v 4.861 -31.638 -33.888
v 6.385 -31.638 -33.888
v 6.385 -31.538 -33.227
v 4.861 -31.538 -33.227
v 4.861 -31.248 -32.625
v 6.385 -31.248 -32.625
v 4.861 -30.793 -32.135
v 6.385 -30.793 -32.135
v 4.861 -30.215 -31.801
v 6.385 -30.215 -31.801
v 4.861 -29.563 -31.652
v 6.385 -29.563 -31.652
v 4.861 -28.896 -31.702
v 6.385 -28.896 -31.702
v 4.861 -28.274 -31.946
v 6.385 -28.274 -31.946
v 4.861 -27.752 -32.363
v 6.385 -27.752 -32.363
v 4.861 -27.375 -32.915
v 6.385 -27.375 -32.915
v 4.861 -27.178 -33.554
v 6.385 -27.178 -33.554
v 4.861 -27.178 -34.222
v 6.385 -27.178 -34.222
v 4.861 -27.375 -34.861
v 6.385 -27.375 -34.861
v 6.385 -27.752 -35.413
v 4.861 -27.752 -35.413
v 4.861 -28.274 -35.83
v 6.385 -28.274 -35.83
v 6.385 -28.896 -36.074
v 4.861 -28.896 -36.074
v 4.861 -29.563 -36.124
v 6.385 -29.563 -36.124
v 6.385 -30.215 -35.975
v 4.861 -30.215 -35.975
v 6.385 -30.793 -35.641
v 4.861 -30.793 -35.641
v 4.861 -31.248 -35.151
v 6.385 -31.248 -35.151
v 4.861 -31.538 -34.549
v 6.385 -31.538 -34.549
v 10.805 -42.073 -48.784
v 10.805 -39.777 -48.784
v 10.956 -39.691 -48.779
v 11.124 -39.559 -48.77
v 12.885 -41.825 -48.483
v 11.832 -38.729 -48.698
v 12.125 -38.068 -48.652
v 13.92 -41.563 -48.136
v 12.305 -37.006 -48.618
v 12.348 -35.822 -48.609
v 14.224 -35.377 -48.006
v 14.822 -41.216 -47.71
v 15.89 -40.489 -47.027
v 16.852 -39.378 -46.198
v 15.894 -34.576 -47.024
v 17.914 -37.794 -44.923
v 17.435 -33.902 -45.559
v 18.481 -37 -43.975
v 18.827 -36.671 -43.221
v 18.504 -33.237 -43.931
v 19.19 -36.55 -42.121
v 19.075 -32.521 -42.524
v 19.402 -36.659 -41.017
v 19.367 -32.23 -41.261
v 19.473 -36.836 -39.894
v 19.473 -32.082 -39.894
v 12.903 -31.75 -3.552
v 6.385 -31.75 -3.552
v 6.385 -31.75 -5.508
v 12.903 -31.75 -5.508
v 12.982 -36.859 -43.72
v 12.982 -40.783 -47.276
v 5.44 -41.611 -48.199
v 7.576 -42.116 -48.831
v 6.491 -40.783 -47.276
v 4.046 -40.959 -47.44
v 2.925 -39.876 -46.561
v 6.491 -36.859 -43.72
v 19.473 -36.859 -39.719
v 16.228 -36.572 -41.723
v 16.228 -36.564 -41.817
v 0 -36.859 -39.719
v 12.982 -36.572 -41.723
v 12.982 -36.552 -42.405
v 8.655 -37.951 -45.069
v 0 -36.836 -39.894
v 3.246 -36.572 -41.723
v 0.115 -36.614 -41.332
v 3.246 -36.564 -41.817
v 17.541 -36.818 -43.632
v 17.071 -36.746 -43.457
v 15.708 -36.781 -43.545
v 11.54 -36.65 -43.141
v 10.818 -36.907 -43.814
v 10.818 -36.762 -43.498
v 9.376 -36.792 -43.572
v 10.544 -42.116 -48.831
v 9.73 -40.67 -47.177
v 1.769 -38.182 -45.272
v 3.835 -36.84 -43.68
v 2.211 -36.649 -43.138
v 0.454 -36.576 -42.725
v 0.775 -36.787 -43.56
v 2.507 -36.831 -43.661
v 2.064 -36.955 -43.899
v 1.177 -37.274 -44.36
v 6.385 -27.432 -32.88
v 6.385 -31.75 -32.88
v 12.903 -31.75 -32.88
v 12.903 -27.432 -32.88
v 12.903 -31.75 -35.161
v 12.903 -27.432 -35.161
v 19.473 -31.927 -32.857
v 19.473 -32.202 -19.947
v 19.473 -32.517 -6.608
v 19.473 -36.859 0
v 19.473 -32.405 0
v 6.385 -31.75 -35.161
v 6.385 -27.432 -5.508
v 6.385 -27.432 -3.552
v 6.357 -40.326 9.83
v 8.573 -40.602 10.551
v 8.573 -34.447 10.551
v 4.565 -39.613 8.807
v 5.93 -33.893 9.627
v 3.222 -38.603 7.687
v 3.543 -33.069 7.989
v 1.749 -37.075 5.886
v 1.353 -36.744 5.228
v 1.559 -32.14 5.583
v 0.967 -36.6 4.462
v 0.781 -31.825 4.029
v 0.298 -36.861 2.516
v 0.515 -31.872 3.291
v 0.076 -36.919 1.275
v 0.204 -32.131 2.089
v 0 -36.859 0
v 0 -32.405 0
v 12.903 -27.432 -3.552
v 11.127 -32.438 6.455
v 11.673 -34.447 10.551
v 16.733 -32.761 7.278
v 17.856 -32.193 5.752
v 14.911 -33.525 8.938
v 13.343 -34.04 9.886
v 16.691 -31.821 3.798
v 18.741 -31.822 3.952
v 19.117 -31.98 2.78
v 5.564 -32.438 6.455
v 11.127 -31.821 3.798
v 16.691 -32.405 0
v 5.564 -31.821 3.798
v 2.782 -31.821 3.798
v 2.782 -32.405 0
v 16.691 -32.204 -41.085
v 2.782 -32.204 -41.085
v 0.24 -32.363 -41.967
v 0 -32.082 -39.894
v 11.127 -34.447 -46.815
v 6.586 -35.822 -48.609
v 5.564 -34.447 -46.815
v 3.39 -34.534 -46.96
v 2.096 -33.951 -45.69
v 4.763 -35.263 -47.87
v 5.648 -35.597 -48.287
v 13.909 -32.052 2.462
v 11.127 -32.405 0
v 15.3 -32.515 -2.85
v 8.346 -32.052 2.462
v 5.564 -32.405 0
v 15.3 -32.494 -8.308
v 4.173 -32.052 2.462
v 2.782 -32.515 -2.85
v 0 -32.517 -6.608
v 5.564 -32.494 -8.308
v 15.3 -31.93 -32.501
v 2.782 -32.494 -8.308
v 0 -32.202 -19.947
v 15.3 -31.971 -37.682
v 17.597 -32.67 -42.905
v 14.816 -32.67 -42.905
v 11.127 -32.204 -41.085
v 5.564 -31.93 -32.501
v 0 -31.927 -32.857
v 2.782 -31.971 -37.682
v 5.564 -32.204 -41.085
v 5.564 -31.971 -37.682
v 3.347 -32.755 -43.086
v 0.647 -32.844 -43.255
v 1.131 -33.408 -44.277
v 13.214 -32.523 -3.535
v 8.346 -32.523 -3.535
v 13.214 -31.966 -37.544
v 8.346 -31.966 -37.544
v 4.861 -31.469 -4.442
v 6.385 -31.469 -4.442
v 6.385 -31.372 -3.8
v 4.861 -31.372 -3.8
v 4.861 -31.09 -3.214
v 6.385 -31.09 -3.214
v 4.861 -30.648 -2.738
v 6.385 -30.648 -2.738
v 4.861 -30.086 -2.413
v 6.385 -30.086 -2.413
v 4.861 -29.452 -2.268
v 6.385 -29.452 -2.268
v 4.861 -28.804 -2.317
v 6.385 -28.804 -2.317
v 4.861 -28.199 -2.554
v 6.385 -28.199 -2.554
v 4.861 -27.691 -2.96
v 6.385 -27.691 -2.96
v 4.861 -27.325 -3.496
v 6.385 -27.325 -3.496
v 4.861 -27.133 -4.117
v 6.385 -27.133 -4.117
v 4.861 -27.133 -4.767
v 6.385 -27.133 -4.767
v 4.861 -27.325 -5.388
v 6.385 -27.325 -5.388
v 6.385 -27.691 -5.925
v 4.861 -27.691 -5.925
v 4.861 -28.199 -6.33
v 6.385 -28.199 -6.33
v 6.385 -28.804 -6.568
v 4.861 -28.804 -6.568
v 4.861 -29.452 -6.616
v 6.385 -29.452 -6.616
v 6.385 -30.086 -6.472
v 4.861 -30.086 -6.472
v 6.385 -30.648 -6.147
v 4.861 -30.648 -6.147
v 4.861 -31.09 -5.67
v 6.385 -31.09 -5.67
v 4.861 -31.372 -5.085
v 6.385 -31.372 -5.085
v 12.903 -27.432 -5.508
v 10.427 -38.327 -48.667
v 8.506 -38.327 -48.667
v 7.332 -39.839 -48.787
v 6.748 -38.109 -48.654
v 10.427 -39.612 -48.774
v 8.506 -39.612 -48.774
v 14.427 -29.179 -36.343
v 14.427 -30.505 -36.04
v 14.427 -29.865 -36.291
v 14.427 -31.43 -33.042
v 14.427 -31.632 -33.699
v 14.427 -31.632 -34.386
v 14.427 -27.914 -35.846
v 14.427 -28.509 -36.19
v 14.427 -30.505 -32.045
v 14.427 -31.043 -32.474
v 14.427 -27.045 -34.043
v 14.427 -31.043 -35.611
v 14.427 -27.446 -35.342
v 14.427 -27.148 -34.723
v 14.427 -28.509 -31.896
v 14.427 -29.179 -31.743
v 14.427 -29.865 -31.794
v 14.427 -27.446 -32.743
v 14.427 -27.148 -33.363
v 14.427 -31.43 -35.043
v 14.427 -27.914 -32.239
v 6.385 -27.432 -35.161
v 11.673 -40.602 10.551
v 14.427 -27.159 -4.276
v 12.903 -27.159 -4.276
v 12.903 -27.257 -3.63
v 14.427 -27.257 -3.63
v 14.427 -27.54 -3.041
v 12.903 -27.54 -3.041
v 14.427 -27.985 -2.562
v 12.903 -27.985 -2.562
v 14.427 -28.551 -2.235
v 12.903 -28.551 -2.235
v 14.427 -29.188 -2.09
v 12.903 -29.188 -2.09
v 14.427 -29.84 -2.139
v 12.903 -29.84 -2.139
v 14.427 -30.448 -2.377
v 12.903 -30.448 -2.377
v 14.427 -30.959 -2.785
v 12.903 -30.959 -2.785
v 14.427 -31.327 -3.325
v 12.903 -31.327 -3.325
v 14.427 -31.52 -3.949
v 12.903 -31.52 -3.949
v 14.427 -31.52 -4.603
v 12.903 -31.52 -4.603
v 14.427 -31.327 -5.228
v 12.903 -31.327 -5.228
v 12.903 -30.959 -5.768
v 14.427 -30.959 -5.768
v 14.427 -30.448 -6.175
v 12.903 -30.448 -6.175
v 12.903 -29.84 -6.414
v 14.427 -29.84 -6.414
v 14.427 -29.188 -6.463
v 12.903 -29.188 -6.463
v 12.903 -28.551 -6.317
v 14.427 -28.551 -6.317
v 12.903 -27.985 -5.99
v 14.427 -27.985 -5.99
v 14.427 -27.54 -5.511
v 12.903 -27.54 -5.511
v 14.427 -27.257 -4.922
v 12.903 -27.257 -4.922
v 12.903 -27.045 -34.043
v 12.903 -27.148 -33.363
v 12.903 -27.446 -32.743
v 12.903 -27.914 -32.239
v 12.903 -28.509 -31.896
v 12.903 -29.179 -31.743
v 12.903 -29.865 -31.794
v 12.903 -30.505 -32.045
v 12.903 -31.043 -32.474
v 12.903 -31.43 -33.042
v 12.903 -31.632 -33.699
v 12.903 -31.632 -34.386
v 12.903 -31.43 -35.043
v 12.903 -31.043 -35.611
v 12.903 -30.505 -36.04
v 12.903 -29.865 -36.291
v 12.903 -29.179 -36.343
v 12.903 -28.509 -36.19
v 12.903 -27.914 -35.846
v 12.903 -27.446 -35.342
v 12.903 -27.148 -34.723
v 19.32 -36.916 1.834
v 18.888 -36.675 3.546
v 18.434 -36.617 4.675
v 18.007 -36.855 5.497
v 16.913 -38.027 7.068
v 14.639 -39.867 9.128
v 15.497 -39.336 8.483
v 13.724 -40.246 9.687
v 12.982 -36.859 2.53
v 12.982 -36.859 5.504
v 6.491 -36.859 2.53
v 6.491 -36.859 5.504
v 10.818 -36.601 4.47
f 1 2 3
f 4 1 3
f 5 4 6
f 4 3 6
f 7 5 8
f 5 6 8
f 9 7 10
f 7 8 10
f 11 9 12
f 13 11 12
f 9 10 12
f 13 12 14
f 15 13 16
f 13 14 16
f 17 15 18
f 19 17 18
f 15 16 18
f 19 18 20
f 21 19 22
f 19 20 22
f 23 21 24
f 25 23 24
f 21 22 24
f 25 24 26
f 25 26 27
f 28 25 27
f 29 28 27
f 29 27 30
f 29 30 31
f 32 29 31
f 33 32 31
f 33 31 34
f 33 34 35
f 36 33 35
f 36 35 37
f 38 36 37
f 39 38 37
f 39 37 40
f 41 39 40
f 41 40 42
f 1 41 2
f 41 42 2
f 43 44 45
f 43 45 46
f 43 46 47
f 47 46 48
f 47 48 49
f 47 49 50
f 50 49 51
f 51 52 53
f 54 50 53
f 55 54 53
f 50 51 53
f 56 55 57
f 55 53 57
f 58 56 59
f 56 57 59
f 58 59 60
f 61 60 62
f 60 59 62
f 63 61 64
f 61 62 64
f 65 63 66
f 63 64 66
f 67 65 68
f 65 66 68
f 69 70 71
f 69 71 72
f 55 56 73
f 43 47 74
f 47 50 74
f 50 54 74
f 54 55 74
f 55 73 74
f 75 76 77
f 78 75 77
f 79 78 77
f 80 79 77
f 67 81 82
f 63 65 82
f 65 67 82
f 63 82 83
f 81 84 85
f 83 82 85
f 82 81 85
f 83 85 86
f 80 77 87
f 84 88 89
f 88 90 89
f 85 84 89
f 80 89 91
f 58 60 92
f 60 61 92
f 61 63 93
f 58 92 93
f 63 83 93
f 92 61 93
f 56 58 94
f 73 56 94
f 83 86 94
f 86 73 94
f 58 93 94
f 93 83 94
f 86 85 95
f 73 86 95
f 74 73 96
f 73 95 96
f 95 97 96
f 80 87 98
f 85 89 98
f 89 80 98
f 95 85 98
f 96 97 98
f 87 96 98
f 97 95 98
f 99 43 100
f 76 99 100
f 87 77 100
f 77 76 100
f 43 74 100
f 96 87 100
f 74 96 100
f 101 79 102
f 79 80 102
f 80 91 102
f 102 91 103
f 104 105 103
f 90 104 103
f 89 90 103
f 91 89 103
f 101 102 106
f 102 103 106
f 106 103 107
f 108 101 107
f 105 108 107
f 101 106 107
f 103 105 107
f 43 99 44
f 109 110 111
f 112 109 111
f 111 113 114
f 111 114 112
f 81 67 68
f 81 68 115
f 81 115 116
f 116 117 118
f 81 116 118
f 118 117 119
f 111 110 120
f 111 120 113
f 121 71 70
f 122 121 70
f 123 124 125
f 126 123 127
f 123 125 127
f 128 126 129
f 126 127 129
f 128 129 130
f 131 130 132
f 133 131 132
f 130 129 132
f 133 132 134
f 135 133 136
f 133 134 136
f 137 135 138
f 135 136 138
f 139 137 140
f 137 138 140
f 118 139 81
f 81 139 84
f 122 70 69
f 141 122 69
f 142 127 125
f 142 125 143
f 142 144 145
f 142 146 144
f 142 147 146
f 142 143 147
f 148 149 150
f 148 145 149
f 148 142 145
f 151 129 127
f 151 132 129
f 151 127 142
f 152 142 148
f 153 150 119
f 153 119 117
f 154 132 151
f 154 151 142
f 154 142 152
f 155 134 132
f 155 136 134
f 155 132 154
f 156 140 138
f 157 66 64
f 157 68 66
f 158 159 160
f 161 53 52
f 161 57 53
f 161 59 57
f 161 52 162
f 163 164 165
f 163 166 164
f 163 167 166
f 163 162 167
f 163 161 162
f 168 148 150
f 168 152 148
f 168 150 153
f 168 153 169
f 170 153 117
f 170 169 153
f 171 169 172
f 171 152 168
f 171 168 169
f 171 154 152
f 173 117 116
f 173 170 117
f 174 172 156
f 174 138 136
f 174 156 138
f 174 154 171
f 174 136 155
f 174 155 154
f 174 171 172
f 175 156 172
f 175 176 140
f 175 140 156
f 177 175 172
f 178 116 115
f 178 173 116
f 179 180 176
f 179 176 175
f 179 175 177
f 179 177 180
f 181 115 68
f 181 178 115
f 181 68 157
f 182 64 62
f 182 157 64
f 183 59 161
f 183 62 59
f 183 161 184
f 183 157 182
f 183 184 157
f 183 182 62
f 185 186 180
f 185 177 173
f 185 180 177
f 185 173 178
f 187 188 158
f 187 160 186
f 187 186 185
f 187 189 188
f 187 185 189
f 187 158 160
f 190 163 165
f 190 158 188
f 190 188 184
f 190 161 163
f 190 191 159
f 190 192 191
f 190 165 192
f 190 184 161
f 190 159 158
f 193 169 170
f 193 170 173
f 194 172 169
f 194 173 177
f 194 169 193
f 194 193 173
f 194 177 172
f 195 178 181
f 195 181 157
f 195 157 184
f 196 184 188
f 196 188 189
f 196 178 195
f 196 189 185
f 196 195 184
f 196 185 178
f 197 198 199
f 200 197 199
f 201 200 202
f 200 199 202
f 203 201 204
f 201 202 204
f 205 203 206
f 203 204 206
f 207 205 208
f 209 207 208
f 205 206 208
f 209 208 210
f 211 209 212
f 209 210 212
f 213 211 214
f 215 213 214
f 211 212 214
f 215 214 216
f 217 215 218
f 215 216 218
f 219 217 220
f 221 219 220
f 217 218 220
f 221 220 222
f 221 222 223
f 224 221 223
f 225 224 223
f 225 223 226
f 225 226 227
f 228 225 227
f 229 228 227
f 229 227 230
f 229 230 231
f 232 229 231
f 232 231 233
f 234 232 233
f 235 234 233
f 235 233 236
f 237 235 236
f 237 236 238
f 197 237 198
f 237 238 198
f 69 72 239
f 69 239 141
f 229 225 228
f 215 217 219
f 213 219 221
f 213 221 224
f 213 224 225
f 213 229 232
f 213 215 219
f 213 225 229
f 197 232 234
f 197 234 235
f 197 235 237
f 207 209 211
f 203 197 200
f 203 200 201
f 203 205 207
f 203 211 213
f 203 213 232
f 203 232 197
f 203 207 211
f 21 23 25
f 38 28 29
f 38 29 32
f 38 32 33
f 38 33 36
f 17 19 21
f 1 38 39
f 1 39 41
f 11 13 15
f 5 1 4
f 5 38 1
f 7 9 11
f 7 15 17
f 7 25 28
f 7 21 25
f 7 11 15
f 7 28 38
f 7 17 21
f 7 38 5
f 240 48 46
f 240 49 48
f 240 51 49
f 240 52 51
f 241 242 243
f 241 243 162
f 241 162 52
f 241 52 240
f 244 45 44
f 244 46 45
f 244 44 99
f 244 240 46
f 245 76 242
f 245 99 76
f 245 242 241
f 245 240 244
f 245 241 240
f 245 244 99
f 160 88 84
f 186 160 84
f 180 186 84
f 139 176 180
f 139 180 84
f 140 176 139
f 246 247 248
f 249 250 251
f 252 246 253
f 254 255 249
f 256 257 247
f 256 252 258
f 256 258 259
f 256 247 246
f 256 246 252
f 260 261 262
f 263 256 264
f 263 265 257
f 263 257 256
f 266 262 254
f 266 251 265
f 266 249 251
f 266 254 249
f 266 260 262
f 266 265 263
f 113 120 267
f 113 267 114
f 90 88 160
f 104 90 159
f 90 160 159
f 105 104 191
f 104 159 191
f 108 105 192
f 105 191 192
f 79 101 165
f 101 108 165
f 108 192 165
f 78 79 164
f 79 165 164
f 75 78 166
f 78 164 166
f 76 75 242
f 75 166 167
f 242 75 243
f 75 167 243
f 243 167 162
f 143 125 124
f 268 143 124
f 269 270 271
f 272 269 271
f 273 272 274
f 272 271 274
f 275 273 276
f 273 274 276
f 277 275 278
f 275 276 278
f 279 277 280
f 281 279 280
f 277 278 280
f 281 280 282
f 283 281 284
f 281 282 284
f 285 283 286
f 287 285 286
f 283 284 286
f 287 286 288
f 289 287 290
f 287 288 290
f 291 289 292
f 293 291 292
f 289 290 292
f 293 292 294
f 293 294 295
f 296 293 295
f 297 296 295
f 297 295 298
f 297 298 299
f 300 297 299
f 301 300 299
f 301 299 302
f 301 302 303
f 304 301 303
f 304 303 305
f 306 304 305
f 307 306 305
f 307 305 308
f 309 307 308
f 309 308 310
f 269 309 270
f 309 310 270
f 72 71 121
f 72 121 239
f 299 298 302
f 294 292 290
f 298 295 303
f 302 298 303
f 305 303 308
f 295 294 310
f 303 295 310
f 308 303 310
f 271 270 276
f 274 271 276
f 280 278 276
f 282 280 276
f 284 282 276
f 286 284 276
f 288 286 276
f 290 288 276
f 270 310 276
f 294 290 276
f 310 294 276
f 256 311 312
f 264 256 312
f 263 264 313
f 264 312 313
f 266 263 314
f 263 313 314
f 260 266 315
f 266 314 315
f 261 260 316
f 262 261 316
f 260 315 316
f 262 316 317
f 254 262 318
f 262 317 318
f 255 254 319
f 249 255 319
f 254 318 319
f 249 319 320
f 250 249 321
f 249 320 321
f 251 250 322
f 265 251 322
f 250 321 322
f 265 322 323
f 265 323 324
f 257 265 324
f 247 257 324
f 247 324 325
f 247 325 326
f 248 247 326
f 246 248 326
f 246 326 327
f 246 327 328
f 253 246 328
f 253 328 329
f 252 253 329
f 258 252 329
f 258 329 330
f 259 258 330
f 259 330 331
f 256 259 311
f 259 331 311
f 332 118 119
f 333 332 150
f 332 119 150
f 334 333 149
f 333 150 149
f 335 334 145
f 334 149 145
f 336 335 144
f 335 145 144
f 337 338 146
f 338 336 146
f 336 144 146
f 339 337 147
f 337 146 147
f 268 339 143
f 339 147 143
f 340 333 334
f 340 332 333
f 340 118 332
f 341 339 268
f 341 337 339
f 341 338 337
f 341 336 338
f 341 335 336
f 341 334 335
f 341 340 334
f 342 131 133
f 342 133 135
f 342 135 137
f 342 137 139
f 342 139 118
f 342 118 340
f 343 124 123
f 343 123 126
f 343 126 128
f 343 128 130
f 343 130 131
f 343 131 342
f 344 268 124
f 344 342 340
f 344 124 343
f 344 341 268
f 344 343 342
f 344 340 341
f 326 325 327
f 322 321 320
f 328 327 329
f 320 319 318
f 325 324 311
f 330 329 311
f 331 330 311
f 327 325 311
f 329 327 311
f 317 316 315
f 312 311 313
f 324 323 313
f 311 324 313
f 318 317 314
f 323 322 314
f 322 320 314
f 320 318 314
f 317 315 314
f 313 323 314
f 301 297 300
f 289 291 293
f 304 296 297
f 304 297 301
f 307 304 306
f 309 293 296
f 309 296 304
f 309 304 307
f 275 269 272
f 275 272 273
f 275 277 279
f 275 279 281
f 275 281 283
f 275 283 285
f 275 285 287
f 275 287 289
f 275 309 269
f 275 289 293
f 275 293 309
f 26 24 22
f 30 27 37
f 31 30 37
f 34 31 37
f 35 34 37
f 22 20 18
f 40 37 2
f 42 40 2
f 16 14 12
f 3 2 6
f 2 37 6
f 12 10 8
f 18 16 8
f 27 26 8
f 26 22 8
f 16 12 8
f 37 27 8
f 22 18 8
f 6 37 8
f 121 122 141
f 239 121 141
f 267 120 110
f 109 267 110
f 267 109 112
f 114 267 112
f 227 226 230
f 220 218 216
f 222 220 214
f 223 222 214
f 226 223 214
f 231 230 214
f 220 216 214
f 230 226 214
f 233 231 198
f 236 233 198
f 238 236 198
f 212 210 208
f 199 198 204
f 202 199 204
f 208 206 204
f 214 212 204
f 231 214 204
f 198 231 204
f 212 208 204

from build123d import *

# Parameters (mm, degrees)
F0_W      = 19.4730237126
F0_H      = 39.8938767612
F1_DEPTH  = 53.848
F4_DEPTH  = 118.11
F6_W      = 6.517266389
F6_H      = 1.9551778678
F7_DEPTH  = 4.318
F6_H_2    = 2.2810436785
F9_R      = 2.192505397
F10_DEPTH = 1.524
F9_R_2    = 2.3064764246
F12_R     = 2.242194372
F13_DEPTH = 1.524
F12_R_2   = 2.1799890435


with BuildPart() as f1:
    # F0 (on Front) → F1 (new body)
    with BuildSketch(Plane.XZ):
        with Locations((9.7365118563, -19.9469383806)):
            Rectangle(F0_W, F0_H)
        with BuildLine():
            ThreePointArc((10.8052724972, 10.7791246846), (3.1663808531, 7.6312424071), (0, 0))
            Line((0, 0), (19.4730237126, 0))
            ThreePointArc((19.4730237126, 0), (17.0373024717, 6.9159135351), (10.8052724972, 10.7791246846))
        make_face()
        with BuildLine():
            Line((19.4730237126, -39.8938767612), (0, -39.8938767612))
            ThreePointArc((0, -39.8938767612), (3.3036640813, -46.8900531098), (10.8052724972, -48.7838722765))
            ThreePointArc((10.8052724972, -48.7838722765), (16.9474550511, -46.101974928), (19.4730237126, -39.8938767612))
        make_face()
    extrude(amount=F1_DEPTH)

    # F3 (on offset) → F4 (intersect)
    with BuildSketch(Plane.YZ.offset(-49.022)):
        with BuildLine():
            add(Edge.make_bspline(
                [(-36.8586873474, 0), (-36.8919603895, 0.7530999839), (-37.0778688158, 2.6144761287), (-35.7895641145, 5.8111939968), (-40.2475164006, 8.8692086598), (-40.6020059403, 10.5510757451)],
                knots=[0, 0, 0, 0, 0.2732019747, 0.5694140182, 1, 1, 1, 1], degree=3))
            Line((-36.8586873474, 0), (-36.8586873474, -39.7190079093))
            add(Edge.make_bspline(
                [(-36.8586873474, -39.7190079093), (-36.7087489656, -40.9834027512), (-35.7081874891, -44.1675387969), (-41.0345357649, -47.0236409696), (-41.7142958558, -48.4058483971), (-42.1163775027, -48.8312616944)],
                knots=[0, 0, 0, 0, 0.348890724, 0.7503059728, 1, 1, 1, 1], degree=3))
            add(Edge.make_bspline(
                [(-35.8224385996, -48.6092516411), (-39.7488554586, -48.6092516411), (-38.1899606436, -48.8312616944), (-42.1163775027, -48.8312616944)],
                knots=[0, 0, 0, 0, 6.2978532358, 6.2978532358, 6.2978532358, 6.2978532358], degree=3))
            add(Edge.make_bspline(
                [(-34.446722697, 10.5510757451), (-33.6319148723, 9.2869111044), (-32.3839047516, 6.6117773426), (-31.508076892, 3.4361304962), (-33.5045467559, 0.4415943039), (-30.8030067117, -41.7990229537), (-33.3714799088, -43.6102367567), (-34.2955524257, -47.1147462947), (-35.2845534591, -47.7893097907), (-35.8224385996, -48.6092516411)],
                knots=[0, 0, 0, 0, 0.1244128912, 0.2206003607, 0.3347836335, 0.7081307119, 0.8125450974, 0.9124165958, 1, 1, 1, 1], degree=3))
            Line((-34.446722697, 10.5510757451), (-40.6020059403, 10.5510757451))
        make_face()
    extrude(amount=F4_DEPTH, mode=Mode.INTERSECT)


with BuildPart() as f7:
    # F6 (on offset) → F7 (new body)
    with BuildSketch(Plane.XZ.offset(31.75)):
        with Locations((9.6440364141, -4.5299254125)):
            Rectangle(F6_W, F6_H)
    extrude(amount=-F7_DEPTH)


with BuildPart() as f7b:
    # F6 (on offset) → F7, piece 2 (new body)
    with BuildSketch(Plane.XZ.offset(31.75)):
        with Locations((9.6440364141, -34.0205524117)):
            Rectangle(F6_W, F6_H_2)
    extrude(amount=-F7_DEPTH)


with BuildPart() as f10:
    # F9 (on offset) → F10 (new body)
    with BuildSketch(Plane.YZ.offset(12.9026696086)):
        with Locations((-29.3517373502, -4.27623)):
            Circle(F9_R)
    extrude(amount=F10_DEPTH)


with BuildPart() as f10b:
    # F9 (on offset) → F10, piece 2 (new body)
    with BuildSketch(Plane.YZ.offset(12.9026696086)):
        with Locations((-29.3517373502, -34.0426564217)):
            Circle(F9_R_2)
    extrude(amount=F10_DEPTH)


with BuildPart() as f13:
    # F12 (on offset) → F13 (new body)
    with BuildSketch(Plane(origin=(6.3854032196, 0, 0), x_dir=(0, -1, 0), z_dir=(-1, 0, 0))):
        with Locations((29.3953735381, -33.8879860938)):
            Circle(F12_R)
    extrude(amount=F13_DEPTH)


with BuildPart() as f13b:
    # F12 (on offset) → F13, piece 2 (new body)
    with BuildSketch(Plane(origin=(6.3854032196, 0, 0), x_dir=(0, -1, 0), z_dir=(-1, 0, 0))):
        with Locations((29.2891394347, -4.44234116)):
            Circle(F12_R_2)
    extrude(amount=F13_DEPTH)


solid = Compound([f1.part, f7.part, f7b.part, f10.part, f10b.part, f13.part, f13b.part])
